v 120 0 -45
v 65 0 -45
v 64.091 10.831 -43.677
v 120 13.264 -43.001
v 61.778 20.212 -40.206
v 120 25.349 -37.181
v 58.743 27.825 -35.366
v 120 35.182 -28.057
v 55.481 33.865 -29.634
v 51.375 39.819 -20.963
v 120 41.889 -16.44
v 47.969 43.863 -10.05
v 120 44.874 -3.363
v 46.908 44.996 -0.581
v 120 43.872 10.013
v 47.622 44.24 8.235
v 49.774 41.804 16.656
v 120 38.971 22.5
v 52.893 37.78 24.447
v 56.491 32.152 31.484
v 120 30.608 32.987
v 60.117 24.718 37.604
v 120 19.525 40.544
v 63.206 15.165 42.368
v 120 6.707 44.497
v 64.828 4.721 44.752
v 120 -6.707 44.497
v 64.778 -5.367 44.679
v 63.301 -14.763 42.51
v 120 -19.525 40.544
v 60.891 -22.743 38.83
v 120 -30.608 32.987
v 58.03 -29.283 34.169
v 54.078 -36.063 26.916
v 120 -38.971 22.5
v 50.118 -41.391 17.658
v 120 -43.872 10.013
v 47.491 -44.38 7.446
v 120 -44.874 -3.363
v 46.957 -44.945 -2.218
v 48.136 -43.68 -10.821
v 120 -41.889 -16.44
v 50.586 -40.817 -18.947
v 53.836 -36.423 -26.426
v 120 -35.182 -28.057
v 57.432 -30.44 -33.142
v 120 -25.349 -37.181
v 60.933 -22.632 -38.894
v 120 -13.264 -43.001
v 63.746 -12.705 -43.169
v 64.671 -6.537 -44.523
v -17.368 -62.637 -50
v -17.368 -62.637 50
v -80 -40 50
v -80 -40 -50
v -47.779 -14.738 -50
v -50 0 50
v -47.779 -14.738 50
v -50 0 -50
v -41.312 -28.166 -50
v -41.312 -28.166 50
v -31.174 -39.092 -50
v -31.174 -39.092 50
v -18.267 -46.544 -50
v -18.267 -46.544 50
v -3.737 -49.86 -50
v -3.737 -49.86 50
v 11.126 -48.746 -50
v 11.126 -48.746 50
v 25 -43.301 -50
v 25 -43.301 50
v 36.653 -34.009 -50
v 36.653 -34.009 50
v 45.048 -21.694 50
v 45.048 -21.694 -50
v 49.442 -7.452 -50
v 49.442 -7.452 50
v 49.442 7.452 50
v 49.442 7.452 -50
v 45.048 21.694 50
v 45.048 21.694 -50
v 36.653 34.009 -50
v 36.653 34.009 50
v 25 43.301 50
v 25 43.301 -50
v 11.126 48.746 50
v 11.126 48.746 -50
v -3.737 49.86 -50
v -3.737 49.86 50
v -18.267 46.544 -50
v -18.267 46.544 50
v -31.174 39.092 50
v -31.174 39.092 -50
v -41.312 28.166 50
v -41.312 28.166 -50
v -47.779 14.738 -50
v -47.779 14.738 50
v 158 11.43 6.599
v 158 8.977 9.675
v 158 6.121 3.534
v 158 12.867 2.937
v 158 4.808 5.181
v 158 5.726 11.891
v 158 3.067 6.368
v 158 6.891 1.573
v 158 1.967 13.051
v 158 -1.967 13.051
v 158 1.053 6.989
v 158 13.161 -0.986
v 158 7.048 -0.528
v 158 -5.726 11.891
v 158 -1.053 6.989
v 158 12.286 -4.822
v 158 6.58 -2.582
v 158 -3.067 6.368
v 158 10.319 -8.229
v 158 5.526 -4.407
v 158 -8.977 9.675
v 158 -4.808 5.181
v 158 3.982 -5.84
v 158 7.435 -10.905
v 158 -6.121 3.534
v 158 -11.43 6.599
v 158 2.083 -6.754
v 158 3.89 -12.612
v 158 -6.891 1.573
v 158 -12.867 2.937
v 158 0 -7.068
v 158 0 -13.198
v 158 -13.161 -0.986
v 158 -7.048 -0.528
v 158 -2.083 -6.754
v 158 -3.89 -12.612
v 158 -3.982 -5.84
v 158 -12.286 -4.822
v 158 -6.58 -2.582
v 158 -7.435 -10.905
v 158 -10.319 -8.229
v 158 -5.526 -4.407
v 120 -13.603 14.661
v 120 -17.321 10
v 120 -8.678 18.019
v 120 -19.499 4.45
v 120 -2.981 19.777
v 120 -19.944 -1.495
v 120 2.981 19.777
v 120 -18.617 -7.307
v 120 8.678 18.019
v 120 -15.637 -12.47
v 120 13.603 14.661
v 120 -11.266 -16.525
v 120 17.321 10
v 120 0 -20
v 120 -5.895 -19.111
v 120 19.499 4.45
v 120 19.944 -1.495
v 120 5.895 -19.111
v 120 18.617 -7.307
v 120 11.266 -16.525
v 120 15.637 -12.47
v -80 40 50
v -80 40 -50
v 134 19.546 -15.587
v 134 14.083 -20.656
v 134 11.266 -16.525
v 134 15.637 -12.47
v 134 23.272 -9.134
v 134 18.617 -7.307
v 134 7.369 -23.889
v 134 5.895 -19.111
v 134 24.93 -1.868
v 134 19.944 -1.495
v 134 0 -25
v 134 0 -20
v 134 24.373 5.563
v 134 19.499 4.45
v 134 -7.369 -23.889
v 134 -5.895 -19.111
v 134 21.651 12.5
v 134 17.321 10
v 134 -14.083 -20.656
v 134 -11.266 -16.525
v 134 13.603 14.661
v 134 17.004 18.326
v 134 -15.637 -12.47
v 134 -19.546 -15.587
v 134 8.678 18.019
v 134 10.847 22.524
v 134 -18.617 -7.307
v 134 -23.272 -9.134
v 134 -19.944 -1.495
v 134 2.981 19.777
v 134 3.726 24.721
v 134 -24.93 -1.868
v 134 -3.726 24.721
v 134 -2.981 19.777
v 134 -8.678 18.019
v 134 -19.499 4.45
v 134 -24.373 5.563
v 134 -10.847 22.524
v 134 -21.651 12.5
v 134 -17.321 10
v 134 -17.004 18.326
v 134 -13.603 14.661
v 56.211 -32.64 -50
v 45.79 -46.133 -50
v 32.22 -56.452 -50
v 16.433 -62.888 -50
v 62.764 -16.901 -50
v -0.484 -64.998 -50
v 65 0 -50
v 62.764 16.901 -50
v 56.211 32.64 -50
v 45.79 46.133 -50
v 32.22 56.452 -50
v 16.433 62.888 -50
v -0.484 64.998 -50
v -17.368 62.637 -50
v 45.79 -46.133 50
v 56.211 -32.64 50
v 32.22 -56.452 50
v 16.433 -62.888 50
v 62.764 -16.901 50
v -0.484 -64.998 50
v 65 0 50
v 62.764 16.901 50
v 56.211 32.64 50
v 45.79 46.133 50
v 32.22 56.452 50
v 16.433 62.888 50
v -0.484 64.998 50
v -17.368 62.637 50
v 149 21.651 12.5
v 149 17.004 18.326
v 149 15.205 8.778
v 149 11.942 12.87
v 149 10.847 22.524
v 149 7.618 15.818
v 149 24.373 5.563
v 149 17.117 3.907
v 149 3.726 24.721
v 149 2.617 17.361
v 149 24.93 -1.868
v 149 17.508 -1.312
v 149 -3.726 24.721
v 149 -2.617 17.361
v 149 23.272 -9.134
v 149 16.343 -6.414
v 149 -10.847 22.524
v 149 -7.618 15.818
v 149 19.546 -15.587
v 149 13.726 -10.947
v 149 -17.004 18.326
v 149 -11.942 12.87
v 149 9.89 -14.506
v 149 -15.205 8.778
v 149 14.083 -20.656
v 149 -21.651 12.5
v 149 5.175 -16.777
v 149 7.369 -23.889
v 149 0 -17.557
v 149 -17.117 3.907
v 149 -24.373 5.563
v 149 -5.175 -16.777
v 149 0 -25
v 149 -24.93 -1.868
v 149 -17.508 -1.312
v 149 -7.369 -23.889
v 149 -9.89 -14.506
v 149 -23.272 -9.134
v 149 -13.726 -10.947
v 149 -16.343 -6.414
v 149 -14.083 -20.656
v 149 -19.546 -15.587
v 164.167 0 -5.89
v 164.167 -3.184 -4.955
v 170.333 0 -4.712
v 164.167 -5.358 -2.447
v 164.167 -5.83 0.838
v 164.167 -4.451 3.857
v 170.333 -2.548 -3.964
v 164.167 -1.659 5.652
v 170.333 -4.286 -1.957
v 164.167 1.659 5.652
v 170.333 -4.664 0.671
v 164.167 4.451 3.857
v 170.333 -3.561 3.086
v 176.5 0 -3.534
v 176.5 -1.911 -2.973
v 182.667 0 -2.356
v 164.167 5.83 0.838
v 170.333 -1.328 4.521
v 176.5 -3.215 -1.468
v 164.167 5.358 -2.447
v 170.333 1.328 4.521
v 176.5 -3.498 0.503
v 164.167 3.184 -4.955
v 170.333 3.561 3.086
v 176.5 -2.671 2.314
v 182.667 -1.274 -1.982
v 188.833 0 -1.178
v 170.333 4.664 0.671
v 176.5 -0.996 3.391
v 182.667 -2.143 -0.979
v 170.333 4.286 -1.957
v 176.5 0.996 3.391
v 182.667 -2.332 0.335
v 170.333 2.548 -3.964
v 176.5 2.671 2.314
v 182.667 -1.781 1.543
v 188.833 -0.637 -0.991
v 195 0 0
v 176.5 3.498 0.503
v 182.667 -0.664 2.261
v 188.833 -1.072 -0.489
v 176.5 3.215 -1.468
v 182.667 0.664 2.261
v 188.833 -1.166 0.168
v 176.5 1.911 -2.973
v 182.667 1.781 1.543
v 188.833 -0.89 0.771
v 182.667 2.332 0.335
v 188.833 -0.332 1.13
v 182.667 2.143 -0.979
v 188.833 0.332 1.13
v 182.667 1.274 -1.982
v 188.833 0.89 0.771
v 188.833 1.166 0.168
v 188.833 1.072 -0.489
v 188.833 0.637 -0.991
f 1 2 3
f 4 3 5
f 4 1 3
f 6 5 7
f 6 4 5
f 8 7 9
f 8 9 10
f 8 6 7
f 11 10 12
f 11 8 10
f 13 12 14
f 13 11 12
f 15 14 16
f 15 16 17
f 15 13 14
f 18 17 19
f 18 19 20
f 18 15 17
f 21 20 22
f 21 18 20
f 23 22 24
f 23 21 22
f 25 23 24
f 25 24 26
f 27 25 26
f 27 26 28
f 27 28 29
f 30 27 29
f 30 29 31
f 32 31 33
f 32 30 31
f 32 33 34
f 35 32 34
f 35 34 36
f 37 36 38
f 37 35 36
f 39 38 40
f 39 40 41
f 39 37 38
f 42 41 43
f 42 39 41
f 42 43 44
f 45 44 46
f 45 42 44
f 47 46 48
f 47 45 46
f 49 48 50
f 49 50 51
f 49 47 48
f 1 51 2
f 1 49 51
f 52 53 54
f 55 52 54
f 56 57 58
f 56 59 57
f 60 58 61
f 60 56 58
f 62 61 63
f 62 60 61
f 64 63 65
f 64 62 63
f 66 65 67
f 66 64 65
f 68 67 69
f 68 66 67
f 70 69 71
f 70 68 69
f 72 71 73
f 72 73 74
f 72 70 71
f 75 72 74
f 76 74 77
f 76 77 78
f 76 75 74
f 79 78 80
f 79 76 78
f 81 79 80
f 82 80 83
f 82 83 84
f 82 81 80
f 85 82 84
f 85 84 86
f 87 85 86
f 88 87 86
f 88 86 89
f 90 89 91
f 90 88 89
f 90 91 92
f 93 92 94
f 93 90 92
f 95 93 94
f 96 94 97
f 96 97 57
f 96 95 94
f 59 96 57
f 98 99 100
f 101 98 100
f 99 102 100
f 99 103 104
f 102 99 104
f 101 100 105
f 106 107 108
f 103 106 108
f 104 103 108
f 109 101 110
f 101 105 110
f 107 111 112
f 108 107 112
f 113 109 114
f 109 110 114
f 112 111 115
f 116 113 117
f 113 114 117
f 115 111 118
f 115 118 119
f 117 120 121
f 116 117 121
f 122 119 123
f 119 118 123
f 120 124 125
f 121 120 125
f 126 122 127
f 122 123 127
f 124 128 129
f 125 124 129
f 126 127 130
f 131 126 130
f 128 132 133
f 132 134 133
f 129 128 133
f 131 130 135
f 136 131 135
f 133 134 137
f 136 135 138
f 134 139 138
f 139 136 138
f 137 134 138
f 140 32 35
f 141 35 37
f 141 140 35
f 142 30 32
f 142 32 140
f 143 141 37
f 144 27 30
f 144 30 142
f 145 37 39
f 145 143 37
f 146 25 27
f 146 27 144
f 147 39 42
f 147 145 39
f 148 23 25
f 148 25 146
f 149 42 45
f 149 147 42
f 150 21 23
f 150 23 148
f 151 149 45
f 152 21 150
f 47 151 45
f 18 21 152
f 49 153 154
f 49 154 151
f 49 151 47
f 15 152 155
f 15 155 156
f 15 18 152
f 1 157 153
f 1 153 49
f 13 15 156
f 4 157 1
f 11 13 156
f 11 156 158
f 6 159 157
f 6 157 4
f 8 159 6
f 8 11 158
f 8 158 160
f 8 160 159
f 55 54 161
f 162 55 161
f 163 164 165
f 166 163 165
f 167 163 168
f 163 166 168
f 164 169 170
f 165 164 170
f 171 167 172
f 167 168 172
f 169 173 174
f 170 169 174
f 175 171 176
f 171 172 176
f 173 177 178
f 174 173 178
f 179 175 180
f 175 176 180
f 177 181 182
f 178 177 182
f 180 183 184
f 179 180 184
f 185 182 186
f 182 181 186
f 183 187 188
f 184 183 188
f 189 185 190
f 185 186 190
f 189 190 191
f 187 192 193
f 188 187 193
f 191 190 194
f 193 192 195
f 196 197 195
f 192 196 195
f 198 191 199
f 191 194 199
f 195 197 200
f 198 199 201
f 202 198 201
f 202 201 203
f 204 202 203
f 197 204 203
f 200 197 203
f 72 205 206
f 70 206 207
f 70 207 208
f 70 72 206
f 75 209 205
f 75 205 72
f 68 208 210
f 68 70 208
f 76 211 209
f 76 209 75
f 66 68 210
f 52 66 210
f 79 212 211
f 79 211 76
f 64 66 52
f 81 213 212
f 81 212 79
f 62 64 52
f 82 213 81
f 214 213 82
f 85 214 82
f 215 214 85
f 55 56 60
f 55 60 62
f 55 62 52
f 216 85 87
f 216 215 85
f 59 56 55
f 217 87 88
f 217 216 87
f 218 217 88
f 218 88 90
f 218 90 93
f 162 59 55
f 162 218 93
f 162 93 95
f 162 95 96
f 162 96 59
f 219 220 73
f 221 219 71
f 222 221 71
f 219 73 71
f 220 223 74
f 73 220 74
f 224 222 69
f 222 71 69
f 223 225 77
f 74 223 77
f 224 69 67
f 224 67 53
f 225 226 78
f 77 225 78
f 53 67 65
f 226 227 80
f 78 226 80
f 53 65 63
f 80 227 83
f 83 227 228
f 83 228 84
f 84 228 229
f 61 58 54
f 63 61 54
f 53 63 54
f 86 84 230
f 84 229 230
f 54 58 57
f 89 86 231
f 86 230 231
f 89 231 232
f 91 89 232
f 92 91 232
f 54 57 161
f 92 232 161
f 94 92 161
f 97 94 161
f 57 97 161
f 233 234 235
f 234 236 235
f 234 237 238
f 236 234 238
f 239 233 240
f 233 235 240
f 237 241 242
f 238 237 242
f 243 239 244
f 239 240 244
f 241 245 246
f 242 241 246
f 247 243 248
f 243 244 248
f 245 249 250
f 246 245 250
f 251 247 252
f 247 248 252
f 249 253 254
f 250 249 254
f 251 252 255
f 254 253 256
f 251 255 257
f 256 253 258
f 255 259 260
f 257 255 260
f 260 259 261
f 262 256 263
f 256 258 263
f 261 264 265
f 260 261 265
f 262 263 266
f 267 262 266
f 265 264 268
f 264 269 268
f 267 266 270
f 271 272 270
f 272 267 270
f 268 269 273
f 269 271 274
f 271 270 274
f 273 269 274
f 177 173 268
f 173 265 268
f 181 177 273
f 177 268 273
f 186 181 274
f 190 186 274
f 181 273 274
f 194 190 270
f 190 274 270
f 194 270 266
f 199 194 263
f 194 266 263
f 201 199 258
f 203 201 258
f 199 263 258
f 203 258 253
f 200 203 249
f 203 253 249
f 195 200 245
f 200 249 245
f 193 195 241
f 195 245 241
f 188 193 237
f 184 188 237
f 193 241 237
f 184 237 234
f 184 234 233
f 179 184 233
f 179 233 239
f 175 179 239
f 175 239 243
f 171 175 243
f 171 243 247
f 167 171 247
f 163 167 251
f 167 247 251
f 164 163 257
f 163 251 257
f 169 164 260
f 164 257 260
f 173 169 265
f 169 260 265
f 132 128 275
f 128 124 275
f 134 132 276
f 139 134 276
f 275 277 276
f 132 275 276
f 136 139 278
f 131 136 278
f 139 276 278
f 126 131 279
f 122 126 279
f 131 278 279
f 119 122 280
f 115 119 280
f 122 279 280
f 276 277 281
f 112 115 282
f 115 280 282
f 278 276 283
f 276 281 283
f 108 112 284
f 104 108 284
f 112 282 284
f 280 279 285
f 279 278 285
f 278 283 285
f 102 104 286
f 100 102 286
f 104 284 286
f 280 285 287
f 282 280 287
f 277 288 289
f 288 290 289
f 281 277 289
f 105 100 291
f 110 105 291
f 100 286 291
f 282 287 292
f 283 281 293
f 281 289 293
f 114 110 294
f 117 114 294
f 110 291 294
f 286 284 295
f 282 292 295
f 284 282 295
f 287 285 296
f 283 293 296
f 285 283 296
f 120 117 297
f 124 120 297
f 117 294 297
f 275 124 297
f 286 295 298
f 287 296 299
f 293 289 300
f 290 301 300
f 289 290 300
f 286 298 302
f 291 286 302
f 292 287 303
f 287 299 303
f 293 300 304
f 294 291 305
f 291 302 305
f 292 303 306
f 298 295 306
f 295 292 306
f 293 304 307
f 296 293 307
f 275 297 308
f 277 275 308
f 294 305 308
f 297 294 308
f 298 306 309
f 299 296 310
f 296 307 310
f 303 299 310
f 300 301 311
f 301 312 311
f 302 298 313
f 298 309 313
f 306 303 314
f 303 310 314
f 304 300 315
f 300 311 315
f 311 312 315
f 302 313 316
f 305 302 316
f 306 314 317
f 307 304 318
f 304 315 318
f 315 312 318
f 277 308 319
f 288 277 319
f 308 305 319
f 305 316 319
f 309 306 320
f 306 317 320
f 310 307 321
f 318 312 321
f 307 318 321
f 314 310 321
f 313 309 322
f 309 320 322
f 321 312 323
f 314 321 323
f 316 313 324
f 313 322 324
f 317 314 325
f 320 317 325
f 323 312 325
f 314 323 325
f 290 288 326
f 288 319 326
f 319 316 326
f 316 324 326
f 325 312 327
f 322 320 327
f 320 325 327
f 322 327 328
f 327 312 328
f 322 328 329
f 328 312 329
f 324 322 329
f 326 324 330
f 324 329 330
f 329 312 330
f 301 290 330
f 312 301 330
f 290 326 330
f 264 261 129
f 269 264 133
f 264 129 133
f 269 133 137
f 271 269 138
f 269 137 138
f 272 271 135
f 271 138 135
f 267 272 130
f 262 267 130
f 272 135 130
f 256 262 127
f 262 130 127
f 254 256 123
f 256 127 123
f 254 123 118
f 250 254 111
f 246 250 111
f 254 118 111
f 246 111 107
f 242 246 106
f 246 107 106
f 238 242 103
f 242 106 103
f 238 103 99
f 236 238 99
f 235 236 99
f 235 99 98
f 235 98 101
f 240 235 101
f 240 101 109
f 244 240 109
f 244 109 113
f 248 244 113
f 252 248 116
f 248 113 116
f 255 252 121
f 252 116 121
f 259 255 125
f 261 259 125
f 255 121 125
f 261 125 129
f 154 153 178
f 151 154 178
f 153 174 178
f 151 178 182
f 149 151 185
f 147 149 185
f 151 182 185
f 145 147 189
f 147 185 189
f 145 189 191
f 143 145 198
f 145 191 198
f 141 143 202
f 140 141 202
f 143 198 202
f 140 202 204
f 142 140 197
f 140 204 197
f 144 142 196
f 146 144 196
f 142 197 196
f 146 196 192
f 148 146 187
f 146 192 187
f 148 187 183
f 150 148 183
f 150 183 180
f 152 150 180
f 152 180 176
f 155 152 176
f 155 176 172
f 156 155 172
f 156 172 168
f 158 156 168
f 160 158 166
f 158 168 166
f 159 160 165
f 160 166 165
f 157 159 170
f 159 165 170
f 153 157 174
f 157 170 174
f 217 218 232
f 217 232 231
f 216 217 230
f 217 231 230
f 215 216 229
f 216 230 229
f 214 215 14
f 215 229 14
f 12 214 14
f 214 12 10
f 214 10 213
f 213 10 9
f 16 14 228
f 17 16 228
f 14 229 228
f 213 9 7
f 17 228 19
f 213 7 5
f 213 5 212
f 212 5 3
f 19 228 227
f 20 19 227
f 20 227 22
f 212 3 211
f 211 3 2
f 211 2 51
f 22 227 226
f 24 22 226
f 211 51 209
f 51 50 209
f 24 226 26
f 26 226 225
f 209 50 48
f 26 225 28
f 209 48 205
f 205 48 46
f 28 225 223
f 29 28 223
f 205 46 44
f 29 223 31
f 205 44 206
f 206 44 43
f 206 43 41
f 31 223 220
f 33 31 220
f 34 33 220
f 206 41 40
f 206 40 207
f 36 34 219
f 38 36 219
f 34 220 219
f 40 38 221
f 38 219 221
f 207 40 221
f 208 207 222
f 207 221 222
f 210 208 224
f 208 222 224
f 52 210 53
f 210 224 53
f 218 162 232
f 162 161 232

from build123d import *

# Parameters (mm, degrees)
SKETCH1_R                = 50
BOSS_EXTRUDE1_DEPTH      = 50
BOSS_EXTRUDE2_REACH      = 218.16
BOSS_EXTRUDE2_END_RADIUS = 65
SKETCH2_R                = 45


with BuildPart() as part:
    # Sketch1 → Boss-Extrude1 (new, symmetric)
    with BuildSketch(Plane.XY):
        with BuildLine():
            Line((-80, -40), (-80, 40))
            Line((-80, 40), (-17.368072784, 62.636650994))
            ThreePointArc((-17.368072784, 62.636650994), (65, 0), (-17.368072784, -62.636650994))
            Line((-17.368072784, -62.636650994), (-80, -40))
        make_face()
        with Locations(Location((0, 0, 0), (0, 0, 180))):
            Circle(SKETCH1_R, mode=Mode.SUBTRACT)
    extrude(amount=BOSS_EXTRUDE1_DEPTH, both=True)

    # Boss-Extrude2: up to this cylinder (the profile starts outside it)
    boss_extrude2_end = Plane(origin=(0, 0, 0), z_dir=(0, 0, -1)) * Cylinder(BOSS_EXTRUDE2_END_RADIUS, 567.32, mode=Mode.PRIVATE)
    # Sketch2 → Boss-Extrude2 (add, up to the surface)
    with BuildSketch(Plane(origin=(120, 0, 0), x_dir=(0, 0, -1), z_dir=(1, 0, 0)), mode=Mode.PRIVATE) as boss_extrude2_sk1:
        Circle(SKETCH2_R)
    boss_extrude2_tool1 = extrude(boss_extrude2_sk1.sketch, amount=-BOSS_EXTRUDE2_REACH, mode=Mode.PRIVATE) - boss_extrude2_end
    add(boss_extrude2_tool1.solids().sort_by_distance((120, 0, 0))[0])

    # Sketch3 → Revolve1 (revolve)
    with BuildSketch(Plane.XY, mode=Mode.PRIVATE) as revolve1_sk:
        Polygon((120, 0), (120, -20), (134, -20), (134, -25), (149, -25), (149, -17.556833969), (158, -13.197935025), (158, -7.068196984), (195, 0), align=None)
    revolve(revolve1_sk.sketch.rotate(Axis((353.949576891, 0, 0), (-1, 0, 0)), 270), axis=Axis((353.949576891, 0, 0), (-1, 0, 0)))


solid = part.part
